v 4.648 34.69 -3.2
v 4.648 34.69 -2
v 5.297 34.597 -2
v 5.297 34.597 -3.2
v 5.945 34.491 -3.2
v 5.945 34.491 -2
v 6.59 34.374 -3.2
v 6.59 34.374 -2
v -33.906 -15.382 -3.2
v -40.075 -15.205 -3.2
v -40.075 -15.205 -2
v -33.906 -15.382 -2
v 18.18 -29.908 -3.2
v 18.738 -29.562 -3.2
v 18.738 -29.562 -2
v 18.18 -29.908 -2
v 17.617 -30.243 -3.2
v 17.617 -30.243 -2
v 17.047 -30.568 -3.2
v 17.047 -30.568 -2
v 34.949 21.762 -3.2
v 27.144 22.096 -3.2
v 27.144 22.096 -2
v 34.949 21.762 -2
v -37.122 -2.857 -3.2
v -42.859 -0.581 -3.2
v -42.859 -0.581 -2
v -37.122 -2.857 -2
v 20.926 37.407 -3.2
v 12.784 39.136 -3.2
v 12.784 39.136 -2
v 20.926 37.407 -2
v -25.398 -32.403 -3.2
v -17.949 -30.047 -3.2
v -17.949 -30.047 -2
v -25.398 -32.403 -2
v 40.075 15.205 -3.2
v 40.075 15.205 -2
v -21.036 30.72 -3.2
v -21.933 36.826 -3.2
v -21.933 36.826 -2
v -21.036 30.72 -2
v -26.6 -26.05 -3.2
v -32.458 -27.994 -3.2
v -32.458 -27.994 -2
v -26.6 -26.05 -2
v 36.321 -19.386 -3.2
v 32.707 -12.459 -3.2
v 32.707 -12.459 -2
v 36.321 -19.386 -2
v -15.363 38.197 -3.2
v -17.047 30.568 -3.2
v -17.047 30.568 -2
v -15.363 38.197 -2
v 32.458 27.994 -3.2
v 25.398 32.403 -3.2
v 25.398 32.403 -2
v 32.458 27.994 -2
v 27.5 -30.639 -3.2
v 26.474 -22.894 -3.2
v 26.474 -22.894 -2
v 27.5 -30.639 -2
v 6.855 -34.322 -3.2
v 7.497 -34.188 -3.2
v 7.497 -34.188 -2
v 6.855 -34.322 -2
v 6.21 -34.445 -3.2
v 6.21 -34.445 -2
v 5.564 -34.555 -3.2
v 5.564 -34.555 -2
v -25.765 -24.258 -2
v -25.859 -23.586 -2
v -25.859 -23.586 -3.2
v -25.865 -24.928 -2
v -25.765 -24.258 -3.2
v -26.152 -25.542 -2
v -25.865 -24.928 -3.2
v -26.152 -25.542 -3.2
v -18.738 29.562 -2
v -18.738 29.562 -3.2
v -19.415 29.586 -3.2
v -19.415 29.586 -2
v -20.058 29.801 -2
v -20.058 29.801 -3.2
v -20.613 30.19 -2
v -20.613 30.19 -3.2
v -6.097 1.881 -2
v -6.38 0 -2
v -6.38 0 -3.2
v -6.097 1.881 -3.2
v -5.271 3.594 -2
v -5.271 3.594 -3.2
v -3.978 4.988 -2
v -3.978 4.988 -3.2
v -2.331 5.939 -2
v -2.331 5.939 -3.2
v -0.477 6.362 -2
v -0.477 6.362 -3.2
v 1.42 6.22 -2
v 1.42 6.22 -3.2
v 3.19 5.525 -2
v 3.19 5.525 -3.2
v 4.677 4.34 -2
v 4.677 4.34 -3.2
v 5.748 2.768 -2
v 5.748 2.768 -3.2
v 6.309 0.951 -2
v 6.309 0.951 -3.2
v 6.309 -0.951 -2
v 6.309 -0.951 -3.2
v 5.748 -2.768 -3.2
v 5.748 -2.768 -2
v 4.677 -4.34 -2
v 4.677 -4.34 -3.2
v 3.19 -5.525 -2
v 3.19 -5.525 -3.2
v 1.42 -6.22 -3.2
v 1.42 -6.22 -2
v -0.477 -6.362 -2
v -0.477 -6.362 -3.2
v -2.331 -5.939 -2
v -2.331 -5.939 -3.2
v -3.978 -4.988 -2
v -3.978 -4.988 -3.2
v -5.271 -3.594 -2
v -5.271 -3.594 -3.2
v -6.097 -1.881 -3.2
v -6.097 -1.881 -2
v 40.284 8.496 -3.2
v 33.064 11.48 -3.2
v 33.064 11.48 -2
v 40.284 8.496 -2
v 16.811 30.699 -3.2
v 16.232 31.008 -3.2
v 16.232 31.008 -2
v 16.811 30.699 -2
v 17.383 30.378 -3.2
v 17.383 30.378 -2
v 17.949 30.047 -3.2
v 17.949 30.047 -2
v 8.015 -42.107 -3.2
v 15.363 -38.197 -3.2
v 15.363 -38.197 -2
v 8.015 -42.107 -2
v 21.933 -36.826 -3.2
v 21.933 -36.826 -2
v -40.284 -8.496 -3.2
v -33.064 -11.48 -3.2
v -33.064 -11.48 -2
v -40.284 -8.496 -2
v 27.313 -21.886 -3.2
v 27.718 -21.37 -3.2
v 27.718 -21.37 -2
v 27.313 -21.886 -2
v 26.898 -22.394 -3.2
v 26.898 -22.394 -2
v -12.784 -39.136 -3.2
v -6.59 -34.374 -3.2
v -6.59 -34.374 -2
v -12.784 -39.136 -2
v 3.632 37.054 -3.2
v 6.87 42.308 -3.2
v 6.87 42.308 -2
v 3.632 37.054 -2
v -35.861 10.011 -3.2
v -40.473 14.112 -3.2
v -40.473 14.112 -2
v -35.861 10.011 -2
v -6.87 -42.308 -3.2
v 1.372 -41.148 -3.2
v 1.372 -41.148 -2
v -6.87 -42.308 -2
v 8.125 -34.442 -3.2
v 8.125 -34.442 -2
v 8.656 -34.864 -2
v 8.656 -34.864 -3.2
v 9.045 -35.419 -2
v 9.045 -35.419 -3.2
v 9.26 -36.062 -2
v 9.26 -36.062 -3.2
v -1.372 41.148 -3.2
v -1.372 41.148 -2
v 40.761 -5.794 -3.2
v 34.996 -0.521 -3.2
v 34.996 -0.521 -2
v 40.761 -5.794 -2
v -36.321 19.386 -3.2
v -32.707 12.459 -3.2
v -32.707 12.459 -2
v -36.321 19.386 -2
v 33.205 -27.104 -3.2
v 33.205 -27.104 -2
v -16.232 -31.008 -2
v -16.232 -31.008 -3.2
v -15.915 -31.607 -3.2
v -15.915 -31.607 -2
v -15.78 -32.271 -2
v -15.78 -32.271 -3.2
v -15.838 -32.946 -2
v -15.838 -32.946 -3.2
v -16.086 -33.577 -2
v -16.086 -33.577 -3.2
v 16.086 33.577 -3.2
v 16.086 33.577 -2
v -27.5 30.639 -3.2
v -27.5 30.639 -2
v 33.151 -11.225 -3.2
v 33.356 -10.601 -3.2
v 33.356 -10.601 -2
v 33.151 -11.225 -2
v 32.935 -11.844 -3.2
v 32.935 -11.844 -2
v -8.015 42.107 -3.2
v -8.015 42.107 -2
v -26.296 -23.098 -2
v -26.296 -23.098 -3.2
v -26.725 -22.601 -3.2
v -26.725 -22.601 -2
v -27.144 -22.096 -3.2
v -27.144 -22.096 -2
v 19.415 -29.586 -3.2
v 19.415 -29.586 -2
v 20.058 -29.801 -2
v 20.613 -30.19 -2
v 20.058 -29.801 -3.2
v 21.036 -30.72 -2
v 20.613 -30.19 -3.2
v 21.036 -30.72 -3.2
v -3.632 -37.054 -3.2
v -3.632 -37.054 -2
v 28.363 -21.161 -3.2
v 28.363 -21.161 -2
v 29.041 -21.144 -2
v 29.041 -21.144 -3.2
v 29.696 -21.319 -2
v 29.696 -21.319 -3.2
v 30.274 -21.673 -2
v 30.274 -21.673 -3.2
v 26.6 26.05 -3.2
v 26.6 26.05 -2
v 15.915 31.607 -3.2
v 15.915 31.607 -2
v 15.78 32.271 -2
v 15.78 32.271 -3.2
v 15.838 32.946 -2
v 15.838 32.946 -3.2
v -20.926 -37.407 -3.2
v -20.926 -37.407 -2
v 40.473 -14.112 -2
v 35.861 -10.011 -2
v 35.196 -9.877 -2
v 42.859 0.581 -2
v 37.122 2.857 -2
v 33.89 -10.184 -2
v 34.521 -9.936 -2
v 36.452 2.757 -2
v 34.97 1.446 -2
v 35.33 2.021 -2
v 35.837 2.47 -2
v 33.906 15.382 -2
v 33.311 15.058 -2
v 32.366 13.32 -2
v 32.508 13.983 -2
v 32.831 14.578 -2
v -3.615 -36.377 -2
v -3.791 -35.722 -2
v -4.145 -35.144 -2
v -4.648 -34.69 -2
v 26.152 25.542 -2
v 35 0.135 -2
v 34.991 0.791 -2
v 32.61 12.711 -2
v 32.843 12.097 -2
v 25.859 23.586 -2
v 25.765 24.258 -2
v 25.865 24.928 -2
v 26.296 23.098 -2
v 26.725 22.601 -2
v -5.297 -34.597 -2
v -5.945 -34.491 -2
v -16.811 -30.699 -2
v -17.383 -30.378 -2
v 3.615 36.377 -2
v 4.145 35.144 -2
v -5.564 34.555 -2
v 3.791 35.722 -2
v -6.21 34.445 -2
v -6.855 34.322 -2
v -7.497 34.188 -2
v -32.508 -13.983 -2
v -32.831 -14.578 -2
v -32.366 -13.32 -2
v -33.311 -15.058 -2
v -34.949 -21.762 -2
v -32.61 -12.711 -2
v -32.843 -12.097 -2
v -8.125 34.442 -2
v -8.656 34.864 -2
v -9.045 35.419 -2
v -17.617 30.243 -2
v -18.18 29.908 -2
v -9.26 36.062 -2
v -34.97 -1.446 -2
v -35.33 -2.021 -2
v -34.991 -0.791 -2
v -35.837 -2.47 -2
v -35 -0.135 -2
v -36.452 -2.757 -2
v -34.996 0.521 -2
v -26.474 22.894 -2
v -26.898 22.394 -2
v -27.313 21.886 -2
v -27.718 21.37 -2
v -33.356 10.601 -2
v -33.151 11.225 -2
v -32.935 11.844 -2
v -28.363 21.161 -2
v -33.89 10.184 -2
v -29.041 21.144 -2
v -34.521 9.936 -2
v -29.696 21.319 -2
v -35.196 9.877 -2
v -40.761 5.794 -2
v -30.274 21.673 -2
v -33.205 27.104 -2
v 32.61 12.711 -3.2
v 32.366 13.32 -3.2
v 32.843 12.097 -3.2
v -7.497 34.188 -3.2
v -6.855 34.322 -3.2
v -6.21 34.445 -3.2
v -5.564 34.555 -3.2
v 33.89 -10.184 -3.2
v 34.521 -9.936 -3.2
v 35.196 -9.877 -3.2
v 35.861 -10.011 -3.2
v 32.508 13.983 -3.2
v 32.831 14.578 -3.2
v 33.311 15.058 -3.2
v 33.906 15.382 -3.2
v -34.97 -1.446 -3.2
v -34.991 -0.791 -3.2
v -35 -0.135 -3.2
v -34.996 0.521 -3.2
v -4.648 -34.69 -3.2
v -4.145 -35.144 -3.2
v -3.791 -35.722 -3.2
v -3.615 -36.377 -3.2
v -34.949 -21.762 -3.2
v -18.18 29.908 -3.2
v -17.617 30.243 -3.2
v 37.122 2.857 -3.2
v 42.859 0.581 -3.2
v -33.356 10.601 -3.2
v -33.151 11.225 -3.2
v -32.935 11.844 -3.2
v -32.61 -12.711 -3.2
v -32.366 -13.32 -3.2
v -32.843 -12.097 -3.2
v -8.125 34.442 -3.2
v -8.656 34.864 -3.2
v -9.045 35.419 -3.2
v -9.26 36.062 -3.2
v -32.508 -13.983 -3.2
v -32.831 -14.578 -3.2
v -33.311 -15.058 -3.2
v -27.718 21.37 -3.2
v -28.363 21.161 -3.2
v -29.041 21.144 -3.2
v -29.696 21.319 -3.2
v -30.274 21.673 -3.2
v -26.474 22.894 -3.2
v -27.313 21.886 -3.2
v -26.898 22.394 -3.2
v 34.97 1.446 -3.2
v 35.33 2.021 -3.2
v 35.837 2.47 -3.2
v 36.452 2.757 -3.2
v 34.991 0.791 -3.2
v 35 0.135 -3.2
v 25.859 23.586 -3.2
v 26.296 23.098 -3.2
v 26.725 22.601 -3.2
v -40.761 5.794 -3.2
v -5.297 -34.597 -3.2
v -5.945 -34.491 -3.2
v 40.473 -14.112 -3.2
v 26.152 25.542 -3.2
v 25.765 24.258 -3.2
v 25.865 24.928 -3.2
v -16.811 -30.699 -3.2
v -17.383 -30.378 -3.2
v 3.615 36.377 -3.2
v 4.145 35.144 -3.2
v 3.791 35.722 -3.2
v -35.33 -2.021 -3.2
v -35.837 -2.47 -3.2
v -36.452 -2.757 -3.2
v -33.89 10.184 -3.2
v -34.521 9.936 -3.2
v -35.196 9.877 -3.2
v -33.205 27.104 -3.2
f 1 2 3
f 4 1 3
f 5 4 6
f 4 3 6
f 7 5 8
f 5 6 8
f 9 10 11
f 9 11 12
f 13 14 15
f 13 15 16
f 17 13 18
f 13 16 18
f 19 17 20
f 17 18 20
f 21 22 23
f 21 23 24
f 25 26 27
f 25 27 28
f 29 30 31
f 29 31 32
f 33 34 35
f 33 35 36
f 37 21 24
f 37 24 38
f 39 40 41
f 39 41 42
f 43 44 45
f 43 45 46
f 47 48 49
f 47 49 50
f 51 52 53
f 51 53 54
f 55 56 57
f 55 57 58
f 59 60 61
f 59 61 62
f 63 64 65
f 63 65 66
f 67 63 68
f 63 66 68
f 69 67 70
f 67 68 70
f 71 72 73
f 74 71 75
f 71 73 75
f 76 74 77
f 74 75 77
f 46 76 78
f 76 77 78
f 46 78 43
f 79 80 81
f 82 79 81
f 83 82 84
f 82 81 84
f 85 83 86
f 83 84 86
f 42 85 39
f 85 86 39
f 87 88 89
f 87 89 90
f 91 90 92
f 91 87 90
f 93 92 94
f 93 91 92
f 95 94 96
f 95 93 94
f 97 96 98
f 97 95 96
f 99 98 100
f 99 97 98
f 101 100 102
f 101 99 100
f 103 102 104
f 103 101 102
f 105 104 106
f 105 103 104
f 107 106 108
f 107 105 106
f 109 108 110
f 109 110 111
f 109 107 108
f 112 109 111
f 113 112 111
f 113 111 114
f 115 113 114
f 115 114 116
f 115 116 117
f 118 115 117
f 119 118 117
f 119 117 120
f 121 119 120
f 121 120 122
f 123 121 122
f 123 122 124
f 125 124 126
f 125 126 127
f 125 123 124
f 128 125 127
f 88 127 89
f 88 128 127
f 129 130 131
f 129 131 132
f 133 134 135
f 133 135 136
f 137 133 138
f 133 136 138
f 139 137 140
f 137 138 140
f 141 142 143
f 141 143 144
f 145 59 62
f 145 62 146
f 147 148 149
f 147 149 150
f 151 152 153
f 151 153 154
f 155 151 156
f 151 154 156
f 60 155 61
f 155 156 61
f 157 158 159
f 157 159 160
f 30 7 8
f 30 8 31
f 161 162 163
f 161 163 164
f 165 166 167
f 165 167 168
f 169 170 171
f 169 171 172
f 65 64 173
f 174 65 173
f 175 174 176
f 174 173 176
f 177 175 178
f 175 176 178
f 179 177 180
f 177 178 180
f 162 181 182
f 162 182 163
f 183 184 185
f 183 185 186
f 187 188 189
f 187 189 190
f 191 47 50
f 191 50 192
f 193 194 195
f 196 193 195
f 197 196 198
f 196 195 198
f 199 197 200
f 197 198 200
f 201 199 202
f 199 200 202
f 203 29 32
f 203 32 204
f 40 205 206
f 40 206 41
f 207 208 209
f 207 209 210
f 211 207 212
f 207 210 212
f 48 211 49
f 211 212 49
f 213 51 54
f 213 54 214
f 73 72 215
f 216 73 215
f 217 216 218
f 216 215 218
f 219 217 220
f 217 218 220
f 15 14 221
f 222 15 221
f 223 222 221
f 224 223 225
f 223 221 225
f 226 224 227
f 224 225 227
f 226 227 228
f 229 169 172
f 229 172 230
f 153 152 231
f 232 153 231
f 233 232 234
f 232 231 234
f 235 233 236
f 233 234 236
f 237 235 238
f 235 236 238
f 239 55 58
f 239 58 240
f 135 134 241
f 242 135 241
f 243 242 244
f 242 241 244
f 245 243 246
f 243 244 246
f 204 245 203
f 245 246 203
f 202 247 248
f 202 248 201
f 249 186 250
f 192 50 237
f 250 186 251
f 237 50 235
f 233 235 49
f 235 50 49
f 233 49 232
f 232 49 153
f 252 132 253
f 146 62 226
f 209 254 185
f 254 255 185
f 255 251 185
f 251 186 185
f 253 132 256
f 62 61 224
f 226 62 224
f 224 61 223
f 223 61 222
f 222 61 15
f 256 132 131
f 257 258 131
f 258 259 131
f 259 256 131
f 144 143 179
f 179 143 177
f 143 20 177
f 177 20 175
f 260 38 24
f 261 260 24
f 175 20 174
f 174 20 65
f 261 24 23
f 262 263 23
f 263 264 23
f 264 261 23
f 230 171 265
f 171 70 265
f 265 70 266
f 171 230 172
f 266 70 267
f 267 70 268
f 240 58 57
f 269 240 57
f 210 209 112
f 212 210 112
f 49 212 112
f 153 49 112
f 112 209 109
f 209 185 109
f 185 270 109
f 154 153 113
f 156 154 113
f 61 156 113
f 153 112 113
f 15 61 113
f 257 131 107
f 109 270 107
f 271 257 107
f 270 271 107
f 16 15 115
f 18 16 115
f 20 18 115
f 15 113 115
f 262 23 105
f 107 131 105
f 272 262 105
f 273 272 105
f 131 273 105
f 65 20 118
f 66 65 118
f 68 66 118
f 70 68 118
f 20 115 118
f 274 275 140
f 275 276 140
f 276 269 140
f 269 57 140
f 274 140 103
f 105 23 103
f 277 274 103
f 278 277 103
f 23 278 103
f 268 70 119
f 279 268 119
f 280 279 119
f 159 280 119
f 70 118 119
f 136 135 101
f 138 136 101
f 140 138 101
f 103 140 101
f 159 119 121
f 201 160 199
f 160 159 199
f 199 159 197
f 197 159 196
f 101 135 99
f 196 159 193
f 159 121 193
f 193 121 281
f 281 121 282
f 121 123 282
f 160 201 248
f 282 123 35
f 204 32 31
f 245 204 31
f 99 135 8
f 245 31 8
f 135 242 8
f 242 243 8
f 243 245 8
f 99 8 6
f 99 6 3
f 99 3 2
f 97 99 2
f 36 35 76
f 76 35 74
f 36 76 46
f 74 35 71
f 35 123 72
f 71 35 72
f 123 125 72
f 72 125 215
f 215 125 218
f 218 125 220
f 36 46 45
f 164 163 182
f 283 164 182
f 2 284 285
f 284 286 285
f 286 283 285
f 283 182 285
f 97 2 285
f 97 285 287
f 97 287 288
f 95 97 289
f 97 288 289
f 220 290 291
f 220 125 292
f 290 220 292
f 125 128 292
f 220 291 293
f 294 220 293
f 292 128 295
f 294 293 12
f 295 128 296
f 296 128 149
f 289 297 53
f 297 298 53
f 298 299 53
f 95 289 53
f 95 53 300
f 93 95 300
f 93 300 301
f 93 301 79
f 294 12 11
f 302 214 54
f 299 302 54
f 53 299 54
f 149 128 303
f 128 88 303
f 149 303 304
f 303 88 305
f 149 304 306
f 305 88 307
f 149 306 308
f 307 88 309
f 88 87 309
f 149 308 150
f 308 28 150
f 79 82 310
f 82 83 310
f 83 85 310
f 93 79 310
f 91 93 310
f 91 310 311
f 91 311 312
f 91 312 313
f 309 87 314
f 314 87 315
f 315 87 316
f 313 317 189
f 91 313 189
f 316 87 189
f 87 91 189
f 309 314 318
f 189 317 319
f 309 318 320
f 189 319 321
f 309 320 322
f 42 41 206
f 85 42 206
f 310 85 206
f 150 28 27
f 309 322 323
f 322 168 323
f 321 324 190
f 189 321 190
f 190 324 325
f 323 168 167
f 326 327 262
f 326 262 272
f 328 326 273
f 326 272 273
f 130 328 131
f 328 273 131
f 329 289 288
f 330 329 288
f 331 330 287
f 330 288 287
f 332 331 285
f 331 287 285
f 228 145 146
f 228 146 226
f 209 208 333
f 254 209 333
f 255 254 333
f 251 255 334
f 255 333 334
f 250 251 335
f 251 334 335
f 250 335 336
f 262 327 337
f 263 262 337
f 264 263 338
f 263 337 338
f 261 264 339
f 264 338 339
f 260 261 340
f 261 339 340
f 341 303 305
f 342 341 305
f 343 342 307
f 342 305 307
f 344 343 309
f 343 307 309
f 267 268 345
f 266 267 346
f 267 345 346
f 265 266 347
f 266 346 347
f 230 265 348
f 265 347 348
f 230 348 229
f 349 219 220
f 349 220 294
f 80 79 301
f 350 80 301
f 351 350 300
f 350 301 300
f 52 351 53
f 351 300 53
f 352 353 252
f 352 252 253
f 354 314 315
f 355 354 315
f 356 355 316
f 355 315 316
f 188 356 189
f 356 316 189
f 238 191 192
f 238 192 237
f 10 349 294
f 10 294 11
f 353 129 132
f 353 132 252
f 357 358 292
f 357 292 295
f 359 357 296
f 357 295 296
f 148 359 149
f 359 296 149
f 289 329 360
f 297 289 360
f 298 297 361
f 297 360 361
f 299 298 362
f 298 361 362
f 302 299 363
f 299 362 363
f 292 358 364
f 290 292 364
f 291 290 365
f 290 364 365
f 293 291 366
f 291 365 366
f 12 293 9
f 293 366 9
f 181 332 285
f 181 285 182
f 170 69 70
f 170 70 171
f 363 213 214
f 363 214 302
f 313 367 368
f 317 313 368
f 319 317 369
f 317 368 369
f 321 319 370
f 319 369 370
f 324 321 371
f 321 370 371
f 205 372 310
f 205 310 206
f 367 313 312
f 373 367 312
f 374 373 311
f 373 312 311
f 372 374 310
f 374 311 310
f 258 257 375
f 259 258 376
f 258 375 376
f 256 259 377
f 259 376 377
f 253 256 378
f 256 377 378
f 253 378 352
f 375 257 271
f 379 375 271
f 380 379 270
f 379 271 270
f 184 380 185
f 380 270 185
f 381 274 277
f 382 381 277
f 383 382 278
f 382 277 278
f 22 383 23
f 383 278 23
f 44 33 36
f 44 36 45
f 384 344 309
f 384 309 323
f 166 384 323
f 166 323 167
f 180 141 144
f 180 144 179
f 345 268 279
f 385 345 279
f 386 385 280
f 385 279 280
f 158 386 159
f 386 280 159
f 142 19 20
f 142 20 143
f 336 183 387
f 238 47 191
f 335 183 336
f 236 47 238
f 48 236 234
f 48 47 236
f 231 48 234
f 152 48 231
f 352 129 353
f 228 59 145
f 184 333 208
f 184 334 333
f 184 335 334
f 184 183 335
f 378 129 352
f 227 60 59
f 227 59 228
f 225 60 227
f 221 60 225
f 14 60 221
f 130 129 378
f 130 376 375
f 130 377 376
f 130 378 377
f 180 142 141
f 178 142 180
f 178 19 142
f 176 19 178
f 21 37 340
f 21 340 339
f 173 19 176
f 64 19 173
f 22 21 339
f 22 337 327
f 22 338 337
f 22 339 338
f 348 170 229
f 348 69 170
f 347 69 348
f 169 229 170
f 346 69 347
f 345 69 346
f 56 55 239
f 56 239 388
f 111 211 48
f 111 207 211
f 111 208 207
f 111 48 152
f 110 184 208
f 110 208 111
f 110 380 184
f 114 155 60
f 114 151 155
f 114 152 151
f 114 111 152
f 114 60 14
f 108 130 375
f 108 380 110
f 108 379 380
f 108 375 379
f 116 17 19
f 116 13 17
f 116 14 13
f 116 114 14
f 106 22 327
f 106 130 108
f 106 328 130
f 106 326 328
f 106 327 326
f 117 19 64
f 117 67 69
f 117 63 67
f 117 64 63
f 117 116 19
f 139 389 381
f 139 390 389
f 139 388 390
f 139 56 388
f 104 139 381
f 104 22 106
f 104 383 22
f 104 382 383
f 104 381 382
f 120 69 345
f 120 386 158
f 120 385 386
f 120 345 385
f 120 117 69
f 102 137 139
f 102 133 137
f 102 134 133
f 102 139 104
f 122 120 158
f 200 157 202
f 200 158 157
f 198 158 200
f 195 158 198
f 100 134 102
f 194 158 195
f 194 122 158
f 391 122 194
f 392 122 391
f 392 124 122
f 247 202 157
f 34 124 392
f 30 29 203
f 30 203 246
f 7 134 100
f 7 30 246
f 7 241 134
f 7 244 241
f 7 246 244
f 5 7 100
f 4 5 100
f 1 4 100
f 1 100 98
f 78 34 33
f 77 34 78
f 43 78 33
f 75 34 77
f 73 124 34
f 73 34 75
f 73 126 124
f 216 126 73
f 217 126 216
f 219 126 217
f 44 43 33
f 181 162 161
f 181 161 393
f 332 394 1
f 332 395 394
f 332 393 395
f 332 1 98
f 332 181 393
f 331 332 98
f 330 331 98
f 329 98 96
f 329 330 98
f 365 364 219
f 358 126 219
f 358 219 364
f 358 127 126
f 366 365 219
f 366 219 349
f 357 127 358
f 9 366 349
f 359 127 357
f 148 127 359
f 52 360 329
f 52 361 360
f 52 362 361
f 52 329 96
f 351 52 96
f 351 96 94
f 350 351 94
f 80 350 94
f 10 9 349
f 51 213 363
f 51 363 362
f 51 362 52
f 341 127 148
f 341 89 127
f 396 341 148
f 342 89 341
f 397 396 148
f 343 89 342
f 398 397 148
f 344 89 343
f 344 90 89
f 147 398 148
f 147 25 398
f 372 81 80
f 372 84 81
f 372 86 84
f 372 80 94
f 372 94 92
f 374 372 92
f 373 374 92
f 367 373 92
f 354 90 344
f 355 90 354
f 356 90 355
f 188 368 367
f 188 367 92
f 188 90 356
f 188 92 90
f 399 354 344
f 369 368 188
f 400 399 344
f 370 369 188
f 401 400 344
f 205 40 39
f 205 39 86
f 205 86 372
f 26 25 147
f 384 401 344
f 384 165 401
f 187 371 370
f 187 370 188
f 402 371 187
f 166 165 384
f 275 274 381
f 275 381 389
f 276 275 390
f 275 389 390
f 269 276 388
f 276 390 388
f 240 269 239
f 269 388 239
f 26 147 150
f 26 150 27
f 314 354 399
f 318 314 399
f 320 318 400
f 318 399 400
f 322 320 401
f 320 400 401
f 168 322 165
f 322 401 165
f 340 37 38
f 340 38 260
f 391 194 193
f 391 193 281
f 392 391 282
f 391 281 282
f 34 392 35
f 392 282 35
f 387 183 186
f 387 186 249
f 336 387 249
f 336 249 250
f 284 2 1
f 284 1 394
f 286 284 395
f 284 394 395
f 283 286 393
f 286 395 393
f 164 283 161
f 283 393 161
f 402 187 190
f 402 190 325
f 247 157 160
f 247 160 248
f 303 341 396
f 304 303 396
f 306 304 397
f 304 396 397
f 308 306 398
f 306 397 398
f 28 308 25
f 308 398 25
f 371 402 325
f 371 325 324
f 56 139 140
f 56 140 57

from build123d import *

# Parameters (mm, degrees)
SKETCH_R             = 35
SKETCH_R_2           = 6.38
PAD_DEPTH            = 1.2
PAD001_DEPTH         = 1.2
POLARPATTERN_COUNT   = 18
BODY_PLACEMENT_ANGLE = 180


with BuildPart() as part:
    # Sketch → Pad (new body)
    with BuildSketch(Plane.XY):
        Circle(SKETCH_R)
        Circle(SKETCH_R_2, mode=Mode.SUBTRACT)
    extrude(amount=PAD_DEPTH)

    # Sketch001 (on Face4 of Pad) → Pad001 (join)
    with BuildSketch(Plane.XY.offset(1.2)):
        with BuildLine():
            Line((5.56366, 34.554966), (1.372105, 41.147792))
            Line((1.372105, 41.147792), (-6.869961, 42.308363))
            Line((-6.869961, 42.308363), (-3.632167, 37.054228))
            ThreePointArc((-6.589755, 34.374047), (-4.375665, 34.902736), (-3.632167, 37.054228))
            Line((-6.589755, 34.374047), (-4.485629, 26.553919))
            Line((3.9883, 26.28405), (-4.485629, 26.553919))
            Line((5.56366, 34.554966), (3.9883, 26.28405))
        make_face()
    pad001 = extrude(amount=-PAD001_DEPTH)

    # PolarPattern: Pad001 ×18 about axis
    polarpattern_axis = Axis((0, 0, 0), (0, 0, 1))
    for i in range(1, POLARPATTERN_COUNT):
        add(pad001.rotate(polarpattern_axis, i * 360 / POLARPATTERN_COUNT))


with BuildPart() as part_1:
    # Body placement: moved
    add(part.part.moved(Location((0, 0, -2))).rotate(Axis((0, 0, -2), (0, 1, 0)), BODY_PLACEMENT_ANGLE))


solid = part_1.part
